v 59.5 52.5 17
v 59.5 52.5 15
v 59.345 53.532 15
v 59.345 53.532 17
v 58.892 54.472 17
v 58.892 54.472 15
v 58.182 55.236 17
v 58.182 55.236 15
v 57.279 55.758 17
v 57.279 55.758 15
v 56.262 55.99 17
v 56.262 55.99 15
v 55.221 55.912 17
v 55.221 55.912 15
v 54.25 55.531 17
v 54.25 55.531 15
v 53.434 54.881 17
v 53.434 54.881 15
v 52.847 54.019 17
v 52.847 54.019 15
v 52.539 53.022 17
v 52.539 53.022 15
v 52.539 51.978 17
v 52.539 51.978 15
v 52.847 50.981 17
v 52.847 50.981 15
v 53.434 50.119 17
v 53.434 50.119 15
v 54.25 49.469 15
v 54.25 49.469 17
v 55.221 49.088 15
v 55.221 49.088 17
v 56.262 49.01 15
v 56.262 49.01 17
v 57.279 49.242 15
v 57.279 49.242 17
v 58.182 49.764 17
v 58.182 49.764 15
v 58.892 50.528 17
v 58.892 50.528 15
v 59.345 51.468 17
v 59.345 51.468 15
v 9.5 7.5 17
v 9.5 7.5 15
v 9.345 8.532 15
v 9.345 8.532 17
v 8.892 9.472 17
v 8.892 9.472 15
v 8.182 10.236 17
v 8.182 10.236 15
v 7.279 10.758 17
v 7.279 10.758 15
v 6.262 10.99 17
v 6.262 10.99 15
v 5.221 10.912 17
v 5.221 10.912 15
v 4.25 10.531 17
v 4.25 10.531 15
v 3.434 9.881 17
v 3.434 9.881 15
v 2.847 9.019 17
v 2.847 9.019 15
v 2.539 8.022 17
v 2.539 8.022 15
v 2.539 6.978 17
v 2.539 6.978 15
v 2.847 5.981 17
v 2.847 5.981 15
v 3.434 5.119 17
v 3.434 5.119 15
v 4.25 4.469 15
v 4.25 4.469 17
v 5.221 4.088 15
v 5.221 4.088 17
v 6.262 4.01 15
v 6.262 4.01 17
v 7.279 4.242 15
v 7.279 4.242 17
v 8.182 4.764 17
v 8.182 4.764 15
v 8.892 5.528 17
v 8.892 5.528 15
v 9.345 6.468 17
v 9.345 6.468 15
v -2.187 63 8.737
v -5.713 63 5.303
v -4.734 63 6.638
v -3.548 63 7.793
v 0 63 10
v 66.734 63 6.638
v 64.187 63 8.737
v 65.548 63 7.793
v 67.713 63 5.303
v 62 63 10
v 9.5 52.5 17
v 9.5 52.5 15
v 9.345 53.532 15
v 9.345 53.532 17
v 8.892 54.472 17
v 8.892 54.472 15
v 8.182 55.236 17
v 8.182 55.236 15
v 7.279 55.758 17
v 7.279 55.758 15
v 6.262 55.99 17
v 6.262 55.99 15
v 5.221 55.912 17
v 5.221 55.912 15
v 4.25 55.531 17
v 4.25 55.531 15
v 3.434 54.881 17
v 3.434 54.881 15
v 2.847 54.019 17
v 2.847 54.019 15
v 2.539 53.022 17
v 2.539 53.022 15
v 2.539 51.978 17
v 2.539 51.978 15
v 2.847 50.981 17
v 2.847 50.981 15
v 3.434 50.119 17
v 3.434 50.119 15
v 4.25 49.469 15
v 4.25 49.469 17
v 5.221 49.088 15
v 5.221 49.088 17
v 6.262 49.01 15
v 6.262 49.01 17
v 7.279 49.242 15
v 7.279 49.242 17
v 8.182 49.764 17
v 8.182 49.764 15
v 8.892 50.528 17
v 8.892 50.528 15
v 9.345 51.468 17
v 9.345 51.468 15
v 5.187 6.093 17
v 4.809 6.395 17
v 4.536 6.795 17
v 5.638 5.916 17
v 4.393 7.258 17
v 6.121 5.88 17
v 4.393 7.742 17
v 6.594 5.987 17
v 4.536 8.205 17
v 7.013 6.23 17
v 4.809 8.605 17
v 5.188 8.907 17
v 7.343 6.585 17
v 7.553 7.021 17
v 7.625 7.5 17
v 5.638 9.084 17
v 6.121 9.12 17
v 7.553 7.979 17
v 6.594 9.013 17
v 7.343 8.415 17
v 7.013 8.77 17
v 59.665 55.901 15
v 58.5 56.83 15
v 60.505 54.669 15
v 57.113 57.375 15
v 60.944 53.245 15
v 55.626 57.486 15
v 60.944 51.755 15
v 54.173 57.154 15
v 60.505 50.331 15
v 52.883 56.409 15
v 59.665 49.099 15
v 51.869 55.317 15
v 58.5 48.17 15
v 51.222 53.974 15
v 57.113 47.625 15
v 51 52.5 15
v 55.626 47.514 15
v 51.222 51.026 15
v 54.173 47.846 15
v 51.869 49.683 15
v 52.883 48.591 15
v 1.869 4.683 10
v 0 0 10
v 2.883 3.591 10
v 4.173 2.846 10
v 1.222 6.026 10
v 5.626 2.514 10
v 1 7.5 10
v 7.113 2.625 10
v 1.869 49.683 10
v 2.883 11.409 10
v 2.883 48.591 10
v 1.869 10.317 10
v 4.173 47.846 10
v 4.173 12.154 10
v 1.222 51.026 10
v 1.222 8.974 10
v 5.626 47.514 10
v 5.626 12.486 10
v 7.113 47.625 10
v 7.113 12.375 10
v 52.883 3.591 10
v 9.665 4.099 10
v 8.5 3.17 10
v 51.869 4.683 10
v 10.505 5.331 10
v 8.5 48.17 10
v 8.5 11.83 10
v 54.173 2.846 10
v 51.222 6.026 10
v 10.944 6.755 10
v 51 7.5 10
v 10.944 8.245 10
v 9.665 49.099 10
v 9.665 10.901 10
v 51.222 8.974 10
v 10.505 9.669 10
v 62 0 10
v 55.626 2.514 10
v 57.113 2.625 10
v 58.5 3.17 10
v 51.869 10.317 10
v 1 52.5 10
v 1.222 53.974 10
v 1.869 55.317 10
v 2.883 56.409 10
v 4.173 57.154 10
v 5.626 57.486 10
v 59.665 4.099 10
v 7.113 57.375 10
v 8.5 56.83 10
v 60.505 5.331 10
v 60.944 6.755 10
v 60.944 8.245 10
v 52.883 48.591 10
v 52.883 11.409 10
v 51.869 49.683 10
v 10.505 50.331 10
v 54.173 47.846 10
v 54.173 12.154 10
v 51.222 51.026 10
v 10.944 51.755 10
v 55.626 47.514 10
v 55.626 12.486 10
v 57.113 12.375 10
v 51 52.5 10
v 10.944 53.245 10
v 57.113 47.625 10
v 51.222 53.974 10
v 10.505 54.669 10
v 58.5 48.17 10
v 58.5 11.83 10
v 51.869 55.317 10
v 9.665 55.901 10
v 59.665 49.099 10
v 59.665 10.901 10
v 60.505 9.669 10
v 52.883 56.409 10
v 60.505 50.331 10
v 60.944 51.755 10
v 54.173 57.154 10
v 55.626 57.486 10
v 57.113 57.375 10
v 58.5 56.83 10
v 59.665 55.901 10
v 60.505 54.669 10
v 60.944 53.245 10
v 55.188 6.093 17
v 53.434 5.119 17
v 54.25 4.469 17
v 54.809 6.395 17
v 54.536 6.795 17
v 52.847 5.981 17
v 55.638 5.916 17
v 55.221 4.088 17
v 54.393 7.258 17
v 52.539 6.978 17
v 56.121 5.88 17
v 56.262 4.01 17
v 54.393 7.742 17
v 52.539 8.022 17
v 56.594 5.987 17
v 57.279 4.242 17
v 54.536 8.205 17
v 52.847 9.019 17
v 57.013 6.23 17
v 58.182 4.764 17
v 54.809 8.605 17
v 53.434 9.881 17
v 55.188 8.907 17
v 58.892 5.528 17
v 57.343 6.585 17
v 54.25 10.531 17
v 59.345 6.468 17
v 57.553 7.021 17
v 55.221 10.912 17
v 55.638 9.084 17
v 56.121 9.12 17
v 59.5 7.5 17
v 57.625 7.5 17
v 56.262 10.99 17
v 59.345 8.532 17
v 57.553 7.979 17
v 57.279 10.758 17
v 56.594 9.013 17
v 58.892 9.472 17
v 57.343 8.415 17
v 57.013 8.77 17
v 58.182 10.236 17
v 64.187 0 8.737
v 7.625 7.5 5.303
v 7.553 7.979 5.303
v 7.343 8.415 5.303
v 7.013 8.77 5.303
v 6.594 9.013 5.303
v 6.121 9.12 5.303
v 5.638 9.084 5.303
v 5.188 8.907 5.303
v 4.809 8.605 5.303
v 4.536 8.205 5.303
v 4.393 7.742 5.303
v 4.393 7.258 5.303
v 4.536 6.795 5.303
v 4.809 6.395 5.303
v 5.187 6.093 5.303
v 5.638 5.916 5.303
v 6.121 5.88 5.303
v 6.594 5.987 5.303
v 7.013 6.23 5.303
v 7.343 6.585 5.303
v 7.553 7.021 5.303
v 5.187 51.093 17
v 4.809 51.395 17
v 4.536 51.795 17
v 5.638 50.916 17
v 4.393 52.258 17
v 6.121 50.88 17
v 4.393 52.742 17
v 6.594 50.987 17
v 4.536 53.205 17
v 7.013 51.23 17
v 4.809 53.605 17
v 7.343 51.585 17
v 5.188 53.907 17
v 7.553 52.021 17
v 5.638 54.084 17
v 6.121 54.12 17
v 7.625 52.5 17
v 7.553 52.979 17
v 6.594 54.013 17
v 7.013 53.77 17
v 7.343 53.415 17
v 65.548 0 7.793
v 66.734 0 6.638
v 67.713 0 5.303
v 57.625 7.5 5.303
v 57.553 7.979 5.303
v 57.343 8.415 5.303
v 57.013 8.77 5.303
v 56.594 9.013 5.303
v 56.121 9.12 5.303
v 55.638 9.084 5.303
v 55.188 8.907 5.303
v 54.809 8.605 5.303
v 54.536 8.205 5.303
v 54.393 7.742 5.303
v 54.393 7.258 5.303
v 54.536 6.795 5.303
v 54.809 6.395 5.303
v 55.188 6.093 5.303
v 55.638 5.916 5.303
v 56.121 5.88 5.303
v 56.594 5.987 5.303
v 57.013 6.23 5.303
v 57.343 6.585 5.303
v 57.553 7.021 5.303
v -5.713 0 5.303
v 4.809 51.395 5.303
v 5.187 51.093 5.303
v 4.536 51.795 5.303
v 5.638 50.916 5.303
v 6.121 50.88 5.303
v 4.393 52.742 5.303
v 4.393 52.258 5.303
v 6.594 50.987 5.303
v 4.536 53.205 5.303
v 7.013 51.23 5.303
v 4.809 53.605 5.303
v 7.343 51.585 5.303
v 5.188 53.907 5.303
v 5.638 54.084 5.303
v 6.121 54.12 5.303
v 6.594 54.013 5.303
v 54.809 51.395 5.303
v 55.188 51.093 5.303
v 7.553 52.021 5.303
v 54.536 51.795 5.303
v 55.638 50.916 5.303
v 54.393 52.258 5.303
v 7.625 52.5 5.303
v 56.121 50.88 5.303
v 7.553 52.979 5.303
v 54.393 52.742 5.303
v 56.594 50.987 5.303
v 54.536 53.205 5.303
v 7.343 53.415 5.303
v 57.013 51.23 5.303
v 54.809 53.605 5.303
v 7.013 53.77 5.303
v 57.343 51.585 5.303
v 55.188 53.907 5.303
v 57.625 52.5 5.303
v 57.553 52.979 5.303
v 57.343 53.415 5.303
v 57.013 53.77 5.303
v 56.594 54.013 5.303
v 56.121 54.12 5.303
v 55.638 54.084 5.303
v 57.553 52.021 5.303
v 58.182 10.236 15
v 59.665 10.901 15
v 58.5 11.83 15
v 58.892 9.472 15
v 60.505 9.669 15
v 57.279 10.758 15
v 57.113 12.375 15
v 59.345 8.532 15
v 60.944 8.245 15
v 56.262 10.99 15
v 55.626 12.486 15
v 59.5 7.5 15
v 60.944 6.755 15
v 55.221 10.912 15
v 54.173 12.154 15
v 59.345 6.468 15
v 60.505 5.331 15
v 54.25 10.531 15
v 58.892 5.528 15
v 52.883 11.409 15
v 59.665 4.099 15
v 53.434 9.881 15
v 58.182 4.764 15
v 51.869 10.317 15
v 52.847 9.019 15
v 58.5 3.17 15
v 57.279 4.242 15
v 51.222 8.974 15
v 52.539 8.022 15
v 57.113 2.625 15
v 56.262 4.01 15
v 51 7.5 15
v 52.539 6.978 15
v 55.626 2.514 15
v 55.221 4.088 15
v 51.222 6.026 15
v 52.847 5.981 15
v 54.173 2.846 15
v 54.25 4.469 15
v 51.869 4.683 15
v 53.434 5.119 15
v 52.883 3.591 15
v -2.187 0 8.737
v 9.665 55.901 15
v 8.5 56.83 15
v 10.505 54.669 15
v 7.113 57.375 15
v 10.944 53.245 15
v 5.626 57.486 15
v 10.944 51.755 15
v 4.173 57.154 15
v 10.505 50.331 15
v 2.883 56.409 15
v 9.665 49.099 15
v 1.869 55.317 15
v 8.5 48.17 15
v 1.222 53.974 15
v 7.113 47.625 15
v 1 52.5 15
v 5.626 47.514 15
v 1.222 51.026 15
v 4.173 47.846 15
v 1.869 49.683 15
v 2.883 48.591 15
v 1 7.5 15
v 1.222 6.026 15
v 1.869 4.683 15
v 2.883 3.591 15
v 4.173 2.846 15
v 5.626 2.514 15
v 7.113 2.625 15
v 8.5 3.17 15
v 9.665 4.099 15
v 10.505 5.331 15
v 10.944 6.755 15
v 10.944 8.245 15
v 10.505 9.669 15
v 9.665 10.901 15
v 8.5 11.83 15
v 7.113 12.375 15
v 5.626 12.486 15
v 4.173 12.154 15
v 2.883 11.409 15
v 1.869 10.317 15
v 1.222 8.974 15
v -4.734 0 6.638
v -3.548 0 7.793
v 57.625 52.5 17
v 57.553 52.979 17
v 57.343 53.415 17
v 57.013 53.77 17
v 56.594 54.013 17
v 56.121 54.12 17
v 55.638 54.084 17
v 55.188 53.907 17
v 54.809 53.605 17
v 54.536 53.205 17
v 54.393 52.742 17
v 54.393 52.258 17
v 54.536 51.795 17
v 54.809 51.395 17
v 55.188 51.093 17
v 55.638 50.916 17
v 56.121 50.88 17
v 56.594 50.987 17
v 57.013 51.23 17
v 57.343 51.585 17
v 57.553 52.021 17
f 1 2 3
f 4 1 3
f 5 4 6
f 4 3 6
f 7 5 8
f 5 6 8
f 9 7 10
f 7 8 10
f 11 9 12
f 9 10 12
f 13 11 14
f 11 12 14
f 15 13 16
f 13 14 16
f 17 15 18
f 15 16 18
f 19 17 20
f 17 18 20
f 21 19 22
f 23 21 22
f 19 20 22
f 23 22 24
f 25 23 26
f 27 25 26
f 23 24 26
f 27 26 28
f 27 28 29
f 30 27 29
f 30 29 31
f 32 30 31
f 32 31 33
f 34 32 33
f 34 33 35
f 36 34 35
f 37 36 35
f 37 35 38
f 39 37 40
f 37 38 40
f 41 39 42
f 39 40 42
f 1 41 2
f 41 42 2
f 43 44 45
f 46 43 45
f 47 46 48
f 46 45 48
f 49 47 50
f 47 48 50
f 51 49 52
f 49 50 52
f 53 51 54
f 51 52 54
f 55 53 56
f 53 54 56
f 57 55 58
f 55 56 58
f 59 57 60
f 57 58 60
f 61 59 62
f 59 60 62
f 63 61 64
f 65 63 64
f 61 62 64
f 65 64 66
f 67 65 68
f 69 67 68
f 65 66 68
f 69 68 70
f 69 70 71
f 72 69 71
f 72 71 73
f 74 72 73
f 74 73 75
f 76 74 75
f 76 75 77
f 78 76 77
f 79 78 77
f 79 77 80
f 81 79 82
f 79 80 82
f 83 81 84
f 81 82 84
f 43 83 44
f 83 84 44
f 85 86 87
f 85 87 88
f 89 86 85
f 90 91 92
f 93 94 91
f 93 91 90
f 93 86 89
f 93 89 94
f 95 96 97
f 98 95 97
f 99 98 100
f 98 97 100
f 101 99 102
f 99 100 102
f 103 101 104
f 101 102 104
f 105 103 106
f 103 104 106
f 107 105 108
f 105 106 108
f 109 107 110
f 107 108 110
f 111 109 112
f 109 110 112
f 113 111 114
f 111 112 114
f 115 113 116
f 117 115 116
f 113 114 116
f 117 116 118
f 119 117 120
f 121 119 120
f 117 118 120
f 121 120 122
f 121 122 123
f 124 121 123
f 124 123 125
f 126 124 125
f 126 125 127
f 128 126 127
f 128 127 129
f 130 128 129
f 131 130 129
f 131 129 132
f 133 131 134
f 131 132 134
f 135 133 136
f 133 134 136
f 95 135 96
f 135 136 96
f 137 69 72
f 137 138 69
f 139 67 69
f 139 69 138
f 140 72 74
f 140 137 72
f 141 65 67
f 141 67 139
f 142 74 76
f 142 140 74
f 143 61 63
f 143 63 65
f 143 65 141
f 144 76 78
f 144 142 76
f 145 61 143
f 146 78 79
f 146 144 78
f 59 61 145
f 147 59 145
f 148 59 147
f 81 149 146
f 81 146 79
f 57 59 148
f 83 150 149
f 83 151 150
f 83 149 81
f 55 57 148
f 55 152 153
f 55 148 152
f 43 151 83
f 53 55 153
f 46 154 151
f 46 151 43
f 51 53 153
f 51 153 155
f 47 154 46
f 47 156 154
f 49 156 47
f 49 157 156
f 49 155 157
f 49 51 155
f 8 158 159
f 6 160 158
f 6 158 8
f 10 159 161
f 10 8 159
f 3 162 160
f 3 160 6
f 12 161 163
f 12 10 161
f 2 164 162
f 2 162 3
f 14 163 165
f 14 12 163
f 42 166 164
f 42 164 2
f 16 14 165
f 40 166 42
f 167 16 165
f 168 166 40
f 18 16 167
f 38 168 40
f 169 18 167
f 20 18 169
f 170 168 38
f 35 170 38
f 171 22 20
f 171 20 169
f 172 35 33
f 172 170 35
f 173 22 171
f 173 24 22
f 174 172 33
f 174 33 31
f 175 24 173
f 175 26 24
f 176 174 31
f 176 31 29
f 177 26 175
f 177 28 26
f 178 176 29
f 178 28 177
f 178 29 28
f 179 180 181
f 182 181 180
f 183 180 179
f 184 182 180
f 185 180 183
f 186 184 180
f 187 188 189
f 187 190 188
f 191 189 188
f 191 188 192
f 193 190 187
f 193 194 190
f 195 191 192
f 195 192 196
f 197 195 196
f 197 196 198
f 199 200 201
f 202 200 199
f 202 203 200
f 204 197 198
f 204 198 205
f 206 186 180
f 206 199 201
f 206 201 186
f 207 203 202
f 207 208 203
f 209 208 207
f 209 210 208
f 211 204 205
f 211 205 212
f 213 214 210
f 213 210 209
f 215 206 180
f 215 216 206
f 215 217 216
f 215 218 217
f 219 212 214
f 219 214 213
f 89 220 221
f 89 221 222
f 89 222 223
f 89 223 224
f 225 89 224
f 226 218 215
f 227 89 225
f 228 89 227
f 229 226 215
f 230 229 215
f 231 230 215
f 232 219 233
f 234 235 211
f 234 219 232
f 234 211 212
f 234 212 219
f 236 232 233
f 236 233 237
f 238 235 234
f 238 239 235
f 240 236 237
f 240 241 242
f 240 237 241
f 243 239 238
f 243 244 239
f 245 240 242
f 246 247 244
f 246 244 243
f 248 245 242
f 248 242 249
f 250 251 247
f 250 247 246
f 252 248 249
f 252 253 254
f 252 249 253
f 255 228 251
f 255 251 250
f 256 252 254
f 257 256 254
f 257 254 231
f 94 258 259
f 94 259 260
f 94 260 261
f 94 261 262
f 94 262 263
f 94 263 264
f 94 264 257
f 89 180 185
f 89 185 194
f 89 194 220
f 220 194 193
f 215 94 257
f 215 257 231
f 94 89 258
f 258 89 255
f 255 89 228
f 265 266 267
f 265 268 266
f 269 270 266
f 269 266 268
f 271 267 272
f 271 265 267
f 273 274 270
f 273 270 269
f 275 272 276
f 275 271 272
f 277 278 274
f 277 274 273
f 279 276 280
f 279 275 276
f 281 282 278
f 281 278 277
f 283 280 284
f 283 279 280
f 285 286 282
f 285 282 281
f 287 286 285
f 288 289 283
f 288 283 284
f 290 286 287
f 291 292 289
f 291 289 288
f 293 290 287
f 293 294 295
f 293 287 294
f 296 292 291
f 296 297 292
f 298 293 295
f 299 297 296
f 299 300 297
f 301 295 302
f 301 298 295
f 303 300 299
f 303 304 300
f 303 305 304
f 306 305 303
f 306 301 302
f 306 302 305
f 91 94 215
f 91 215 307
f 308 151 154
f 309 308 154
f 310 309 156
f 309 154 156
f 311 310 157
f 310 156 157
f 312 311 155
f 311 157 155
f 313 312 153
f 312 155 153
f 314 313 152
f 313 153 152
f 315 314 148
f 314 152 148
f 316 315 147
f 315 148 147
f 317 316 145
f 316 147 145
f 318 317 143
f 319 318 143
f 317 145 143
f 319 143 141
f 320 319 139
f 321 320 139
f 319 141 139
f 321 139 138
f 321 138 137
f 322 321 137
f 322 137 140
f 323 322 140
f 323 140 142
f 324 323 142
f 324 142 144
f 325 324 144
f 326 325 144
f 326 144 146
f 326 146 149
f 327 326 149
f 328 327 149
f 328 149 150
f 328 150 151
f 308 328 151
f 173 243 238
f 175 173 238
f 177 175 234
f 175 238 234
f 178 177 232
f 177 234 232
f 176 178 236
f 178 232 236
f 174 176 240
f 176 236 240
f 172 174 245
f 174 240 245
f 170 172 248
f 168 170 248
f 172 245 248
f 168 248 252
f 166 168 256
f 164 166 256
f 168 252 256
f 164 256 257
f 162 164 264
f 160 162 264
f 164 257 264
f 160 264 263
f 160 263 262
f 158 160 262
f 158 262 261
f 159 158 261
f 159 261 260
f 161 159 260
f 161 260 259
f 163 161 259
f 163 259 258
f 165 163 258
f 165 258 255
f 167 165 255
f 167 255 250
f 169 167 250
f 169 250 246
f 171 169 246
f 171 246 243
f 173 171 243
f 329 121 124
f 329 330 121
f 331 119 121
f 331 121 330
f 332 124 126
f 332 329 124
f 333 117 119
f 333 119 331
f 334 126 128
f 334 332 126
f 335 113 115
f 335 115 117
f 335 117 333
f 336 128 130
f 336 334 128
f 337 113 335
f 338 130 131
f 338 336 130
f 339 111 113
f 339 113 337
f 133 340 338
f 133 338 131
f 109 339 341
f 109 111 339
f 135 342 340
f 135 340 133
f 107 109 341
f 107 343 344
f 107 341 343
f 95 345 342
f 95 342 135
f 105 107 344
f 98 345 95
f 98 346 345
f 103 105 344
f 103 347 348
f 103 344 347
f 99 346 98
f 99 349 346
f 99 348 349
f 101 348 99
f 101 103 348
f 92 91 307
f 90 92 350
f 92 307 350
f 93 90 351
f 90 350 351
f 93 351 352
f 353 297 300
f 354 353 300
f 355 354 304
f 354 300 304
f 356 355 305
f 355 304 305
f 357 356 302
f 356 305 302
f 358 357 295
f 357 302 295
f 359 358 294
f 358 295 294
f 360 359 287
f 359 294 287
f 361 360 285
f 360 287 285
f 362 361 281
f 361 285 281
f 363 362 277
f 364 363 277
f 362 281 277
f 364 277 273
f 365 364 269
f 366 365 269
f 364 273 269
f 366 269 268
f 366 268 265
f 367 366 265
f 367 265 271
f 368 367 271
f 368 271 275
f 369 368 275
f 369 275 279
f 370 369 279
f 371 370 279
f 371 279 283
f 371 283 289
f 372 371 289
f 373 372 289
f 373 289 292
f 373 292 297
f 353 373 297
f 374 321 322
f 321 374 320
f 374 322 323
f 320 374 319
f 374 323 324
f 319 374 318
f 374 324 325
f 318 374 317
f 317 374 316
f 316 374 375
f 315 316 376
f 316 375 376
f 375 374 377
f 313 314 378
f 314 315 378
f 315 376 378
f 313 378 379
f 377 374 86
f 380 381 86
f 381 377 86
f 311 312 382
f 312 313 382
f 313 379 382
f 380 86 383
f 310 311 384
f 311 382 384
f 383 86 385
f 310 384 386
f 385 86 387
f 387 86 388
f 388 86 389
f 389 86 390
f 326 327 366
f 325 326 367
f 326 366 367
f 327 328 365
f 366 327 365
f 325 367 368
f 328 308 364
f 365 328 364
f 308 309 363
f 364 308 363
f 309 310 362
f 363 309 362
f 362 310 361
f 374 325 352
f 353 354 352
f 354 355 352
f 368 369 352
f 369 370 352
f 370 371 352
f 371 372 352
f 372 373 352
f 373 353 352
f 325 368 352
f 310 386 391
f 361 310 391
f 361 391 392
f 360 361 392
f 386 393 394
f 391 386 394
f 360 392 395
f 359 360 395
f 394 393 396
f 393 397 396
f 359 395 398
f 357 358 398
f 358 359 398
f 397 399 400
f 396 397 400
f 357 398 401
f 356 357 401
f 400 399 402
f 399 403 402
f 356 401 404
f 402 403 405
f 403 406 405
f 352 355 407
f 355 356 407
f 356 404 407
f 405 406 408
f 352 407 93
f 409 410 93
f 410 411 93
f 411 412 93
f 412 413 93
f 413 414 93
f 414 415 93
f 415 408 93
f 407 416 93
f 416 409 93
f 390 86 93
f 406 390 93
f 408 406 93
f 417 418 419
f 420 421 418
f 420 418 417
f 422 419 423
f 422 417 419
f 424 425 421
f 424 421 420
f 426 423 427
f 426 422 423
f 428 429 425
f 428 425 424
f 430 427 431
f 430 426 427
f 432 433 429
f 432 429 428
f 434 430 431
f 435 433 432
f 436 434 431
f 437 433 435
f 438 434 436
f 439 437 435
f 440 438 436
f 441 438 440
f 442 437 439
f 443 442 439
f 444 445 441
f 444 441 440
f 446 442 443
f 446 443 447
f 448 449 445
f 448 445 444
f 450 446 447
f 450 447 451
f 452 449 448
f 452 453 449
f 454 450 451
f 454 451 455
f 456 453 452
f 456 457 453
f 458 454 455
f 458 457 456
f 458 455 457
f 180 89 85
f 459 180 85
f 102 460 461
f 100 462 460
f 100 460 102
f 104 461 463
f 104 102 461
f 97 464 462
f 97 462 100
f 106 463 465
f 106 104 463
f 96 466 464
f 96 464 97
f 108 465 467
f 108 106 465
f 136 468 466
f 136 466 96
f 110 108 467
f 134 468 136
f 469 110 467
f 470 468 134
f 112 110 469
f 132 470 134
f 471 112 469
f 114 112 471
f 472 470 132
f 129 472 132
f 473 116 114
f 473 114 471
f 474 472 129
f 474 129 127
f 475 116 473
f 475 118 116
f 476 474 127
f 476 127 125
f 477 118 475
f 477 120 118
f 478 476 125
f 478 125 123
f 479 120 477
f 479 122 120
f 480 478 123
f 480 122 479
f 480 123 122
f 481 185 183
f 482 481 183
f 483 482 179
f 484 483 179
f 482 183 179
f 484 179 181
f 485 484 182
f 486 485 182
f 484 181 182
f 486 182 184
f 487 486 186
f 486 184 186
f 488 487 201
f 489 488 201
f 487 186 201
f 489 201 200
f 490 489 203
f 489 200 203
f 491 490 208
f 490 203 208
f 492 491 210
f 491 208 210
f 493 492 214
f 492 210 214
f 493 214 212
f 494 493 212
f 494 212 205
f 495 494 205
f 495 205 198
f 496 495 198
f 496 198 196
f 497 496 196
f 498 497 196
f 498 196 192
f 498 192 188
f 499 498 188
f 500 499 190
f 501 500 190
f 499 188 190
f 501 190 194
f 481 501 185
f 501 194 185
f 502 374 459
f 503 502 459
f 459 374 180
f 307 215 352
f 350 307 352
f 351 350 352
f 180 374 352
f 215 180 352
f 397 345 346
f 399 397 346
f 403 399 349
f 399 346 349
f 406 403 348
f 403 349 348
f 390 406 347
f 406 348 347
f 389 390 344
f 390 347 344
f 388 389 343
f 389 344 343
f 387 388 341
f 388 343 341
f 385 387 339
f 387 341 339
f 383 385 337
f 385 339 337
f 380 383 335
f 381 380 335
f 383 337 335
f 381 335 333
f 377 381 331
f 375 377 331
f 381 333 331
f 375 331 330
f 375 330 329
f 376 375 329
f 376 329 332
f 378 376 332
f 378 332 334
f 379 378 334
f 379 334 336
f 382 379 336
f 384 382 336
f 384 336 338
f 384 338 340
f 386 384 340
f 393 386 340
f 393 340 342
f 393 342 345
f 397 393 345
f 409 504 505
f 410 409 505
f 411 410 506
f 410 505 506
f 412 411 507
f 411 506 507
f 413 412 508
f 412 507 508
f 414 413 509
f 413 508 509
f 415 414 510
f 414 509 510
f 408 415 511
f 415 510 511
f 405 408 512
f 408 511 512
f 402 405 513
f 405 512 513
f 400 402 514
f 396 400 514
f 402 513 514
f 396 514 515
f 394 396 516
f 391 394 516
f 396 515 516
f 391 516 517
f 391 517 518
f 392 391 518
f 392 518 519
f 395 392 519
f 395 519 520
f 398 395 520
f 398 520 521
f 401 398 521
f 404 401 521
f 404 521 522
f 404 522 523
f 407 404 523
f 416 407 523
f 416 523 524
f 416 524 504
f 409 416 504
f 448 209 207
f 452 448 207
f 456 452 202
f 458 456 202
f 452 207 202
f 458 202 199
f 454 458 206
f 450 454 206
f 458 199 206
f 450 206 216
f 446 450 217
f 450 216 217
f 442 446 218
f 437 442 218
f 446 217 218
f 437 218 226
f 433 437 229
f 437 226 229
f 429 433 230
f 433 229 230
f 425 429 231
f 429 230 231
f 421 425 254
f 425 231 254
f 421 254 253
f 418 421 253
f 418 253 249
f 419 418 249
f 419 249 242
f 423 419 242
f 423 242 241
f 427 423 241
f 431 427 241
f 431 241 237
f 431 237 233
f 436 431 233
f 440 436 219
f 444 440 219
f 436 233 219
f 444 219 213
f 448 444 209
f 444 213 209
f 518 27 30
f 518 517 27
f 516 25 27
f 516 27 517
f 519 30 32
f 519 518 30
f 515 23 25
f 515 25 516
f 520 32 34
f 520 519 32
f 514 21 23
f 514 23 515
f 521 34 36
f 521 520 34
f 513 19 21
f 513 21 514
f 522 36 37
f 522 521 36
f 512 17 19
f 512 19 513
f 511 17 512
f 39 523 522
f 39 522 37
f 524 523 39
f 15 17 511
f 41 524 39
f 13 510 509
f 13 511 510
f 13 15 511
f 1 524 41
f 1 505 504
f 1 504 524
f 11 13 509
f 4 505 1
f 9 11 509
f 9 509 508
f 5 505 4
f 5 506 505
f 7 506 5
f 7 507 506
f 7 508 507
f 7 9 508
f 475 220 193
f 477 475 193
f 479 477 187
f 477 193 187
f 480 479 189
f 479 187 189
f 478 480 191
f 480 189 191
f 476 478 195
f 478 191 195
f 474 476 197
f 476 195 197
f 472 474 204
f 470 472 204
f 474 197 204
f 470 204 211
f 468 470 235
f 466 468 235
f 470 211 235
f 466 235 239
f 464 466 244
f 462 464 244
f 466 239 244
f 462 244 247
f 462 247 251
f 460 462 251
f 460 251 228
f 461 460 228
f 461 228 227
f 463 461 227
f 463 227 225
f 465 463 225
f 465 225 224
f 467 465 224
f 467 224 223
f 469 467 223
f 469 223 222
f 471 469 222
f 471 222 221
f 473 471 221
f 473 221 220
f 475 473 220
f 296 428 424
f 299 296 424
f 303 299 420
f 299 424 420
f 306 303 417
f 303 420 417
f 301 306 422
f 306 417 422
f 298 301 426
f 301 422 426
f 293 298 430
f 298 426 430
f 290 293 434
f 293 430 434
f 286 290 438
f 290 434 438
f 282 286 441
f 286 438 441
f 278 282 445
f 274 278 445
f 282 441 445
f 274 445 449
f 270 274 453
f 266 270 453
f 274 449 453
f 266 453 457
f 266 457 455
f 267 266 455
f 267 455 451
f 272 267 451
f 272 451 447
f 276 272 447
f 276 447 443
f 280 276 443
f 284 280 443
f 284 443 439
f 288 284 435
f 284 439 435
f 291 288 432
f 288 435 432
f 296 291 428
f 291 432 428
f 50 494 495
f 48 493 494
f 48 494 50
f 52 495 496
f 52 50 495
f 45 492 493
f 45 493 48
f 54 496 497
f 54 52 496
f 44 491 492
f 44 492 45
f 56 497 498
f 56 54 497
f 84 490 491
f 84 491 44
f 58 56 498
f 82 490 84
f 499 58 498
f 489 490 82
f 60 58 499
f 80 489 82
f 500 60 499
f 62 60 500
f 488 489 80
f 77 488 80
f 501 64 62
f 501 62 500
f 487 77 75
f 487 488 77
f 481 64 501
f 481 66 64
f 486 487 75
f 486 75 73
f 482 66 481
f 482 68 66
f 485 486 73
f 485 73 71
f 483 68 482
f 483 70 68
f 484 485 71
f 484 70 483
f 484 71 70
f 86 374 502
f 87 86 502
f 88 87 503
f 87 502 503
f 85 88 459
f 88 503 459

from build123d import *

# Parameters (mm, degrees)
ESQUISSE1_W                  = 62
ESQUISSE1_H                  = 60
BOSS_EXTRU_1_DEPTH           = 10
ESQUISSE3_R                  = 5
BOSS_EXTRU_2_DEPTH           = 5
ESQUISSE4_R                  = 3.5
BOSS_EXTRU_3_DEPTH           = 2
ESQUISSE5_R                  = 1.625
ENL_V_MAT_EXTRU_2_DEPTH      = 88.93747779
BOSS_EXTRU_4_DEPTH           = 3
ESQUISSE9_R                  = 11
ESQUISSE9_R_2                = 1.625
ESQUISSE9_R_3                = 1.5
ENL_V_MAT_EXTRU_4_DEPTH      = 10
BOSS_EXTRU_6_DEPTH           = 63
ENL_V_MAT_EXTRU_6_DEPTH      = 4
ENL_V_MAT_EXTRU_7_DEPTH      = 102
ENL_V_MAT_EXTRU_8_DEPTH      = 23
ENL_V_MAT_EXTRU_8_DEPTH_BACK = 1
ESQUISSE19_W                 = 42
ESQUISSE19_H                 = 42
CHANFREIN1_SIZE              = 1
CONG_1_R                     = 10
ESQUISSE20_W                 = 96.792413771
ESQUISSE20_H                 = 78.280203487
ENL_V_MAT_EXTRU_10_DEPTH     = 107.575890285


with BuildPart() as part:
    # Esquisse1 → Boss.-Extru.1 (new body)
    with BuildSketch(Plane.XY):
        with Locations((31, 30)):
            Rectangle(ESQUISSE1_W, ESQUISSE1_H)
    extrude(amount=BOSS_EXTRU_1_DEPTH)

    # Esquisse3 → Boss.-Extru.2 (add)
    with BuildSketch(Plane.XY.offset(10)):
        with Locations(Location((6, 52.5, 0), (0, 0, 180))):
            Circle(ESQUISSE3_R)
        with Locations(Location((56, 7.5, 0), (0, 0, 180))):
            Circle(ESQUISSE3_R)
        with Locations(Location((6, 7.5, 0), (0, 0, 180))):
            Circle(ESQUISSE3_R)
        with Locations(Location((56, 52.5, 0), (0, 0, 180))):
            Circle(ESQUISSE3_R)
    extrude(amount=BOSS_EXTRU_2_DEPTH)

    # Esquisse4 → Boss.-Extru.3 (add)
    with BuildSketch(Plane.XY.offset(15)):
        with Locations((6, 52.5)):
            Circle(ESQUISSE4_R)
        with Locations((56, 52.5)):
            Circle(ESQUISSE4_R)
        with Locations((56, 7.5)):
            Circle(ESQUISSE4_R)
        with Locations((6, 7.5)):
            Circle(ESQUISSE4_R)
    extrude(amount=BOSS_EXTRU_3_DEPTH)

    # Esquisse5 → Enlèv. mat.-Extru.2 (cut, through all)
    with BuildSketch(Plane.XY.offset(17)):
        with Locations((6, 52.5)):
            Circle(ESQUISSE5_R)
        with Locations((56, 52.5)):
            Circle(ESQUISSE5_R)
        with Locations((56, 7.5)):
            Circle(ESQUISSE5_R)
        with Locations((6, 7.5)):
            Circle(ESQUISSE5_R)
    extrude(amount=-ENL_V_MAT_EXTRU_2_DEPTH, mode=Mode.SUBTRACT)

    # Esquisse7 → Boss.-Extru.4 (add, symmetric)
    with BuildSketch(Plane(origin=(0, 60, 0), x_dir=(1, 0, 0), z_dir=(0, 1, 0))):
        with BuildLine():
            Line((0, 0), (0, -10))
            Line((0, -10), (62, -10))
            Line((62, -10), (62, 0))
            ThreePointArc((62, 0), (61.543258885, 25.799206928), (56, 51))
            Line((56, 51), (6, 51))
            ThreePointArc((6, 51), (0.456741115, 25.799206928), (0, 0))
        make_face()
    extrude(amount=BOSS_EXTRU_4_DEPTH, both=True)

    # Esquisse9 → Enlèv. mat.-Extru.4 (cut)
    with BuildSketch(Plane(origin=(0, 63, 0), x_dir=(1, 0, 0), z_dir=(0, 1, 0))):
        with Locations(Location((31, 30, 0), (0, 0, 270))):
            Circle(ESQUISSE9_R)
        with Locations(Location((46.5, 14.5, 0), (0, 0, 270))):
            Circle(ESQUISSE9_R_2)
        with Locations(Location((15.5, 14.5, 0), (0, 0, 270))):
            Circle(ESQUISSE9_R_2)
        with Locations(Location((15.5, 45.5, 0), (0, 0, 270))):
            Circle(ESQUISSE9_R_2)
        with Locations(Location((46.5, 45.5, 0), (0, 0, 270))):
            Circle(ESQUISSE9_R_2)
        with Locations(Location((56, 18, 0), (0, 0, 270))):
            Circle(ESQUISSE9_R_3)
        with Locations(Location((6, 18, 0), (0, 0, 270))):
            Circle(ESQUISSE9_R_3)
    extrude(amount=-ENL_V_MAT_EXTRU_4_DEPTH, mode=Mode.SUBTRACT)

    # Esquisse14 → Boss.-Extru.6 (add)
    with BuildSketch(Plane(origin=(0, 63, 0), x_dir=(1, 0, 0), z_dir=(0, 1, 0))):
        with BuildLine():
            Line((0, 0), (0, -10))
            Line((0, -10), (-6.92820323, -6))
            ThreePointArc((-6.92820323, -6), (-4.721429116, 23.465606932), (6, 51))
            Line((6, 51), (11.044473074, 51))
            ThreePointArc((11.044473074, 51), (2.937001082, 26.059854184), (0, 0))
        make_face()
    boss_extru_6 = extrude(amount=-BOSS_EXTRU_6_DEPTH)

    # Symétrie1: Boss.-Extru.6 across plane
    add(boss_extru_6.mirror(Plane(origin=(31, 0, 0), x_dir=(0, 0, 1), z_dir=(1, 0, 0))))

    # Esquisse16 → Enlèv. mat.-Extru.6 (cut)
    with BuildSketch(Plane.XZ.offset(-57)):
        Polygon((10.041451884, -18), (8.020725942, -14.5), (3.979274058, -14.5), (1.958548116, -18), (3.979274058, -21.5), (8.020725942, -21.5), align=None)
        Polygon((60.041451884, -18), (58.020725942, -14.5), (53.979274058, -14.5), (51.958548116, -18), (53.979274058, -21.5), (58.020725942, -21.5), align=None)
    extrude(amount=-ENL_V_MAT_EXTRU_6_DEPTH, mode=Mode.SUBTRACT)

    # Esquisse18 → Enlèv. mat.-Extru.7 (cut, symmetric)
    with BuildSketch(Plane(origin=(0, 0, 0), x_dir=(0, 0, -1), z_dir=(1, 0, 0))):
        with BuildLine():
            Line((51, 53), (51, 0))
            Line((51, 0), (0, 0))
            ThreePointArc((0, 0), (17.977874458, 33.738271748), (51, 53))
        make_face()
    extrude(amount=ENL_V_MAT_EXTRU_7_DEPTH, both=True, mode=Mode.SUBTRACT)

    # Esquisse19 → Enlèv. mat.-Extru.8 (cut, two sides: drawn at the far end of the back side and taken through both)
    with BuildSketch(Plane.XZ.offset(-57).offset(-ENL_V_MAT_EXTRU_8_DEPTH_BACK)):
        with Locations((31, -30)):
            Rectangle(ESQUISSE19_W, ESQUISSE19_H)
    extrude(amount=ENL_V_MAT_EXTRU_8_DEPTH + ENL_V_MAT_EXTRU_8_DEPTH_BACK, mode=Mode.SUBTRACT)

    # Chanfrein1
    chanfrein1_edges = [part.edges().sort_by_distance(p)[0] for p in [
        (31, 63, -41),
    ]]
    chamfer(chanfrein1_edges, length=CHANFREIN1_SIZE)

    # Congé1
    cong_1_edges = [part.edges().sort_by_distance(p)[0] for p in [
        (-6.92820323, 31.5, 6),
        (68.92820323, 31.5, 6),
    ]]
    fillet(cong_1_edges, radius=CONG_1_R)

    # Esquisse20 → Enlèv. mat.-Extru.10 (cut, through all)
    with BuildSketch(Plane(origin=(0, 63, 0), x_dir=(1, 0, 0), z_dir=(0, 1, 0))):
        with Locations((33.820908233, 33.83729602)):
            Rectangle(ESQUISSE20_W, ESQUISSE20_H)
    extrude(amount=-ENL_V_MAT_EXTRU_10_DEPTH, mode=Mode.SUBTRACT)


solid = part.part
